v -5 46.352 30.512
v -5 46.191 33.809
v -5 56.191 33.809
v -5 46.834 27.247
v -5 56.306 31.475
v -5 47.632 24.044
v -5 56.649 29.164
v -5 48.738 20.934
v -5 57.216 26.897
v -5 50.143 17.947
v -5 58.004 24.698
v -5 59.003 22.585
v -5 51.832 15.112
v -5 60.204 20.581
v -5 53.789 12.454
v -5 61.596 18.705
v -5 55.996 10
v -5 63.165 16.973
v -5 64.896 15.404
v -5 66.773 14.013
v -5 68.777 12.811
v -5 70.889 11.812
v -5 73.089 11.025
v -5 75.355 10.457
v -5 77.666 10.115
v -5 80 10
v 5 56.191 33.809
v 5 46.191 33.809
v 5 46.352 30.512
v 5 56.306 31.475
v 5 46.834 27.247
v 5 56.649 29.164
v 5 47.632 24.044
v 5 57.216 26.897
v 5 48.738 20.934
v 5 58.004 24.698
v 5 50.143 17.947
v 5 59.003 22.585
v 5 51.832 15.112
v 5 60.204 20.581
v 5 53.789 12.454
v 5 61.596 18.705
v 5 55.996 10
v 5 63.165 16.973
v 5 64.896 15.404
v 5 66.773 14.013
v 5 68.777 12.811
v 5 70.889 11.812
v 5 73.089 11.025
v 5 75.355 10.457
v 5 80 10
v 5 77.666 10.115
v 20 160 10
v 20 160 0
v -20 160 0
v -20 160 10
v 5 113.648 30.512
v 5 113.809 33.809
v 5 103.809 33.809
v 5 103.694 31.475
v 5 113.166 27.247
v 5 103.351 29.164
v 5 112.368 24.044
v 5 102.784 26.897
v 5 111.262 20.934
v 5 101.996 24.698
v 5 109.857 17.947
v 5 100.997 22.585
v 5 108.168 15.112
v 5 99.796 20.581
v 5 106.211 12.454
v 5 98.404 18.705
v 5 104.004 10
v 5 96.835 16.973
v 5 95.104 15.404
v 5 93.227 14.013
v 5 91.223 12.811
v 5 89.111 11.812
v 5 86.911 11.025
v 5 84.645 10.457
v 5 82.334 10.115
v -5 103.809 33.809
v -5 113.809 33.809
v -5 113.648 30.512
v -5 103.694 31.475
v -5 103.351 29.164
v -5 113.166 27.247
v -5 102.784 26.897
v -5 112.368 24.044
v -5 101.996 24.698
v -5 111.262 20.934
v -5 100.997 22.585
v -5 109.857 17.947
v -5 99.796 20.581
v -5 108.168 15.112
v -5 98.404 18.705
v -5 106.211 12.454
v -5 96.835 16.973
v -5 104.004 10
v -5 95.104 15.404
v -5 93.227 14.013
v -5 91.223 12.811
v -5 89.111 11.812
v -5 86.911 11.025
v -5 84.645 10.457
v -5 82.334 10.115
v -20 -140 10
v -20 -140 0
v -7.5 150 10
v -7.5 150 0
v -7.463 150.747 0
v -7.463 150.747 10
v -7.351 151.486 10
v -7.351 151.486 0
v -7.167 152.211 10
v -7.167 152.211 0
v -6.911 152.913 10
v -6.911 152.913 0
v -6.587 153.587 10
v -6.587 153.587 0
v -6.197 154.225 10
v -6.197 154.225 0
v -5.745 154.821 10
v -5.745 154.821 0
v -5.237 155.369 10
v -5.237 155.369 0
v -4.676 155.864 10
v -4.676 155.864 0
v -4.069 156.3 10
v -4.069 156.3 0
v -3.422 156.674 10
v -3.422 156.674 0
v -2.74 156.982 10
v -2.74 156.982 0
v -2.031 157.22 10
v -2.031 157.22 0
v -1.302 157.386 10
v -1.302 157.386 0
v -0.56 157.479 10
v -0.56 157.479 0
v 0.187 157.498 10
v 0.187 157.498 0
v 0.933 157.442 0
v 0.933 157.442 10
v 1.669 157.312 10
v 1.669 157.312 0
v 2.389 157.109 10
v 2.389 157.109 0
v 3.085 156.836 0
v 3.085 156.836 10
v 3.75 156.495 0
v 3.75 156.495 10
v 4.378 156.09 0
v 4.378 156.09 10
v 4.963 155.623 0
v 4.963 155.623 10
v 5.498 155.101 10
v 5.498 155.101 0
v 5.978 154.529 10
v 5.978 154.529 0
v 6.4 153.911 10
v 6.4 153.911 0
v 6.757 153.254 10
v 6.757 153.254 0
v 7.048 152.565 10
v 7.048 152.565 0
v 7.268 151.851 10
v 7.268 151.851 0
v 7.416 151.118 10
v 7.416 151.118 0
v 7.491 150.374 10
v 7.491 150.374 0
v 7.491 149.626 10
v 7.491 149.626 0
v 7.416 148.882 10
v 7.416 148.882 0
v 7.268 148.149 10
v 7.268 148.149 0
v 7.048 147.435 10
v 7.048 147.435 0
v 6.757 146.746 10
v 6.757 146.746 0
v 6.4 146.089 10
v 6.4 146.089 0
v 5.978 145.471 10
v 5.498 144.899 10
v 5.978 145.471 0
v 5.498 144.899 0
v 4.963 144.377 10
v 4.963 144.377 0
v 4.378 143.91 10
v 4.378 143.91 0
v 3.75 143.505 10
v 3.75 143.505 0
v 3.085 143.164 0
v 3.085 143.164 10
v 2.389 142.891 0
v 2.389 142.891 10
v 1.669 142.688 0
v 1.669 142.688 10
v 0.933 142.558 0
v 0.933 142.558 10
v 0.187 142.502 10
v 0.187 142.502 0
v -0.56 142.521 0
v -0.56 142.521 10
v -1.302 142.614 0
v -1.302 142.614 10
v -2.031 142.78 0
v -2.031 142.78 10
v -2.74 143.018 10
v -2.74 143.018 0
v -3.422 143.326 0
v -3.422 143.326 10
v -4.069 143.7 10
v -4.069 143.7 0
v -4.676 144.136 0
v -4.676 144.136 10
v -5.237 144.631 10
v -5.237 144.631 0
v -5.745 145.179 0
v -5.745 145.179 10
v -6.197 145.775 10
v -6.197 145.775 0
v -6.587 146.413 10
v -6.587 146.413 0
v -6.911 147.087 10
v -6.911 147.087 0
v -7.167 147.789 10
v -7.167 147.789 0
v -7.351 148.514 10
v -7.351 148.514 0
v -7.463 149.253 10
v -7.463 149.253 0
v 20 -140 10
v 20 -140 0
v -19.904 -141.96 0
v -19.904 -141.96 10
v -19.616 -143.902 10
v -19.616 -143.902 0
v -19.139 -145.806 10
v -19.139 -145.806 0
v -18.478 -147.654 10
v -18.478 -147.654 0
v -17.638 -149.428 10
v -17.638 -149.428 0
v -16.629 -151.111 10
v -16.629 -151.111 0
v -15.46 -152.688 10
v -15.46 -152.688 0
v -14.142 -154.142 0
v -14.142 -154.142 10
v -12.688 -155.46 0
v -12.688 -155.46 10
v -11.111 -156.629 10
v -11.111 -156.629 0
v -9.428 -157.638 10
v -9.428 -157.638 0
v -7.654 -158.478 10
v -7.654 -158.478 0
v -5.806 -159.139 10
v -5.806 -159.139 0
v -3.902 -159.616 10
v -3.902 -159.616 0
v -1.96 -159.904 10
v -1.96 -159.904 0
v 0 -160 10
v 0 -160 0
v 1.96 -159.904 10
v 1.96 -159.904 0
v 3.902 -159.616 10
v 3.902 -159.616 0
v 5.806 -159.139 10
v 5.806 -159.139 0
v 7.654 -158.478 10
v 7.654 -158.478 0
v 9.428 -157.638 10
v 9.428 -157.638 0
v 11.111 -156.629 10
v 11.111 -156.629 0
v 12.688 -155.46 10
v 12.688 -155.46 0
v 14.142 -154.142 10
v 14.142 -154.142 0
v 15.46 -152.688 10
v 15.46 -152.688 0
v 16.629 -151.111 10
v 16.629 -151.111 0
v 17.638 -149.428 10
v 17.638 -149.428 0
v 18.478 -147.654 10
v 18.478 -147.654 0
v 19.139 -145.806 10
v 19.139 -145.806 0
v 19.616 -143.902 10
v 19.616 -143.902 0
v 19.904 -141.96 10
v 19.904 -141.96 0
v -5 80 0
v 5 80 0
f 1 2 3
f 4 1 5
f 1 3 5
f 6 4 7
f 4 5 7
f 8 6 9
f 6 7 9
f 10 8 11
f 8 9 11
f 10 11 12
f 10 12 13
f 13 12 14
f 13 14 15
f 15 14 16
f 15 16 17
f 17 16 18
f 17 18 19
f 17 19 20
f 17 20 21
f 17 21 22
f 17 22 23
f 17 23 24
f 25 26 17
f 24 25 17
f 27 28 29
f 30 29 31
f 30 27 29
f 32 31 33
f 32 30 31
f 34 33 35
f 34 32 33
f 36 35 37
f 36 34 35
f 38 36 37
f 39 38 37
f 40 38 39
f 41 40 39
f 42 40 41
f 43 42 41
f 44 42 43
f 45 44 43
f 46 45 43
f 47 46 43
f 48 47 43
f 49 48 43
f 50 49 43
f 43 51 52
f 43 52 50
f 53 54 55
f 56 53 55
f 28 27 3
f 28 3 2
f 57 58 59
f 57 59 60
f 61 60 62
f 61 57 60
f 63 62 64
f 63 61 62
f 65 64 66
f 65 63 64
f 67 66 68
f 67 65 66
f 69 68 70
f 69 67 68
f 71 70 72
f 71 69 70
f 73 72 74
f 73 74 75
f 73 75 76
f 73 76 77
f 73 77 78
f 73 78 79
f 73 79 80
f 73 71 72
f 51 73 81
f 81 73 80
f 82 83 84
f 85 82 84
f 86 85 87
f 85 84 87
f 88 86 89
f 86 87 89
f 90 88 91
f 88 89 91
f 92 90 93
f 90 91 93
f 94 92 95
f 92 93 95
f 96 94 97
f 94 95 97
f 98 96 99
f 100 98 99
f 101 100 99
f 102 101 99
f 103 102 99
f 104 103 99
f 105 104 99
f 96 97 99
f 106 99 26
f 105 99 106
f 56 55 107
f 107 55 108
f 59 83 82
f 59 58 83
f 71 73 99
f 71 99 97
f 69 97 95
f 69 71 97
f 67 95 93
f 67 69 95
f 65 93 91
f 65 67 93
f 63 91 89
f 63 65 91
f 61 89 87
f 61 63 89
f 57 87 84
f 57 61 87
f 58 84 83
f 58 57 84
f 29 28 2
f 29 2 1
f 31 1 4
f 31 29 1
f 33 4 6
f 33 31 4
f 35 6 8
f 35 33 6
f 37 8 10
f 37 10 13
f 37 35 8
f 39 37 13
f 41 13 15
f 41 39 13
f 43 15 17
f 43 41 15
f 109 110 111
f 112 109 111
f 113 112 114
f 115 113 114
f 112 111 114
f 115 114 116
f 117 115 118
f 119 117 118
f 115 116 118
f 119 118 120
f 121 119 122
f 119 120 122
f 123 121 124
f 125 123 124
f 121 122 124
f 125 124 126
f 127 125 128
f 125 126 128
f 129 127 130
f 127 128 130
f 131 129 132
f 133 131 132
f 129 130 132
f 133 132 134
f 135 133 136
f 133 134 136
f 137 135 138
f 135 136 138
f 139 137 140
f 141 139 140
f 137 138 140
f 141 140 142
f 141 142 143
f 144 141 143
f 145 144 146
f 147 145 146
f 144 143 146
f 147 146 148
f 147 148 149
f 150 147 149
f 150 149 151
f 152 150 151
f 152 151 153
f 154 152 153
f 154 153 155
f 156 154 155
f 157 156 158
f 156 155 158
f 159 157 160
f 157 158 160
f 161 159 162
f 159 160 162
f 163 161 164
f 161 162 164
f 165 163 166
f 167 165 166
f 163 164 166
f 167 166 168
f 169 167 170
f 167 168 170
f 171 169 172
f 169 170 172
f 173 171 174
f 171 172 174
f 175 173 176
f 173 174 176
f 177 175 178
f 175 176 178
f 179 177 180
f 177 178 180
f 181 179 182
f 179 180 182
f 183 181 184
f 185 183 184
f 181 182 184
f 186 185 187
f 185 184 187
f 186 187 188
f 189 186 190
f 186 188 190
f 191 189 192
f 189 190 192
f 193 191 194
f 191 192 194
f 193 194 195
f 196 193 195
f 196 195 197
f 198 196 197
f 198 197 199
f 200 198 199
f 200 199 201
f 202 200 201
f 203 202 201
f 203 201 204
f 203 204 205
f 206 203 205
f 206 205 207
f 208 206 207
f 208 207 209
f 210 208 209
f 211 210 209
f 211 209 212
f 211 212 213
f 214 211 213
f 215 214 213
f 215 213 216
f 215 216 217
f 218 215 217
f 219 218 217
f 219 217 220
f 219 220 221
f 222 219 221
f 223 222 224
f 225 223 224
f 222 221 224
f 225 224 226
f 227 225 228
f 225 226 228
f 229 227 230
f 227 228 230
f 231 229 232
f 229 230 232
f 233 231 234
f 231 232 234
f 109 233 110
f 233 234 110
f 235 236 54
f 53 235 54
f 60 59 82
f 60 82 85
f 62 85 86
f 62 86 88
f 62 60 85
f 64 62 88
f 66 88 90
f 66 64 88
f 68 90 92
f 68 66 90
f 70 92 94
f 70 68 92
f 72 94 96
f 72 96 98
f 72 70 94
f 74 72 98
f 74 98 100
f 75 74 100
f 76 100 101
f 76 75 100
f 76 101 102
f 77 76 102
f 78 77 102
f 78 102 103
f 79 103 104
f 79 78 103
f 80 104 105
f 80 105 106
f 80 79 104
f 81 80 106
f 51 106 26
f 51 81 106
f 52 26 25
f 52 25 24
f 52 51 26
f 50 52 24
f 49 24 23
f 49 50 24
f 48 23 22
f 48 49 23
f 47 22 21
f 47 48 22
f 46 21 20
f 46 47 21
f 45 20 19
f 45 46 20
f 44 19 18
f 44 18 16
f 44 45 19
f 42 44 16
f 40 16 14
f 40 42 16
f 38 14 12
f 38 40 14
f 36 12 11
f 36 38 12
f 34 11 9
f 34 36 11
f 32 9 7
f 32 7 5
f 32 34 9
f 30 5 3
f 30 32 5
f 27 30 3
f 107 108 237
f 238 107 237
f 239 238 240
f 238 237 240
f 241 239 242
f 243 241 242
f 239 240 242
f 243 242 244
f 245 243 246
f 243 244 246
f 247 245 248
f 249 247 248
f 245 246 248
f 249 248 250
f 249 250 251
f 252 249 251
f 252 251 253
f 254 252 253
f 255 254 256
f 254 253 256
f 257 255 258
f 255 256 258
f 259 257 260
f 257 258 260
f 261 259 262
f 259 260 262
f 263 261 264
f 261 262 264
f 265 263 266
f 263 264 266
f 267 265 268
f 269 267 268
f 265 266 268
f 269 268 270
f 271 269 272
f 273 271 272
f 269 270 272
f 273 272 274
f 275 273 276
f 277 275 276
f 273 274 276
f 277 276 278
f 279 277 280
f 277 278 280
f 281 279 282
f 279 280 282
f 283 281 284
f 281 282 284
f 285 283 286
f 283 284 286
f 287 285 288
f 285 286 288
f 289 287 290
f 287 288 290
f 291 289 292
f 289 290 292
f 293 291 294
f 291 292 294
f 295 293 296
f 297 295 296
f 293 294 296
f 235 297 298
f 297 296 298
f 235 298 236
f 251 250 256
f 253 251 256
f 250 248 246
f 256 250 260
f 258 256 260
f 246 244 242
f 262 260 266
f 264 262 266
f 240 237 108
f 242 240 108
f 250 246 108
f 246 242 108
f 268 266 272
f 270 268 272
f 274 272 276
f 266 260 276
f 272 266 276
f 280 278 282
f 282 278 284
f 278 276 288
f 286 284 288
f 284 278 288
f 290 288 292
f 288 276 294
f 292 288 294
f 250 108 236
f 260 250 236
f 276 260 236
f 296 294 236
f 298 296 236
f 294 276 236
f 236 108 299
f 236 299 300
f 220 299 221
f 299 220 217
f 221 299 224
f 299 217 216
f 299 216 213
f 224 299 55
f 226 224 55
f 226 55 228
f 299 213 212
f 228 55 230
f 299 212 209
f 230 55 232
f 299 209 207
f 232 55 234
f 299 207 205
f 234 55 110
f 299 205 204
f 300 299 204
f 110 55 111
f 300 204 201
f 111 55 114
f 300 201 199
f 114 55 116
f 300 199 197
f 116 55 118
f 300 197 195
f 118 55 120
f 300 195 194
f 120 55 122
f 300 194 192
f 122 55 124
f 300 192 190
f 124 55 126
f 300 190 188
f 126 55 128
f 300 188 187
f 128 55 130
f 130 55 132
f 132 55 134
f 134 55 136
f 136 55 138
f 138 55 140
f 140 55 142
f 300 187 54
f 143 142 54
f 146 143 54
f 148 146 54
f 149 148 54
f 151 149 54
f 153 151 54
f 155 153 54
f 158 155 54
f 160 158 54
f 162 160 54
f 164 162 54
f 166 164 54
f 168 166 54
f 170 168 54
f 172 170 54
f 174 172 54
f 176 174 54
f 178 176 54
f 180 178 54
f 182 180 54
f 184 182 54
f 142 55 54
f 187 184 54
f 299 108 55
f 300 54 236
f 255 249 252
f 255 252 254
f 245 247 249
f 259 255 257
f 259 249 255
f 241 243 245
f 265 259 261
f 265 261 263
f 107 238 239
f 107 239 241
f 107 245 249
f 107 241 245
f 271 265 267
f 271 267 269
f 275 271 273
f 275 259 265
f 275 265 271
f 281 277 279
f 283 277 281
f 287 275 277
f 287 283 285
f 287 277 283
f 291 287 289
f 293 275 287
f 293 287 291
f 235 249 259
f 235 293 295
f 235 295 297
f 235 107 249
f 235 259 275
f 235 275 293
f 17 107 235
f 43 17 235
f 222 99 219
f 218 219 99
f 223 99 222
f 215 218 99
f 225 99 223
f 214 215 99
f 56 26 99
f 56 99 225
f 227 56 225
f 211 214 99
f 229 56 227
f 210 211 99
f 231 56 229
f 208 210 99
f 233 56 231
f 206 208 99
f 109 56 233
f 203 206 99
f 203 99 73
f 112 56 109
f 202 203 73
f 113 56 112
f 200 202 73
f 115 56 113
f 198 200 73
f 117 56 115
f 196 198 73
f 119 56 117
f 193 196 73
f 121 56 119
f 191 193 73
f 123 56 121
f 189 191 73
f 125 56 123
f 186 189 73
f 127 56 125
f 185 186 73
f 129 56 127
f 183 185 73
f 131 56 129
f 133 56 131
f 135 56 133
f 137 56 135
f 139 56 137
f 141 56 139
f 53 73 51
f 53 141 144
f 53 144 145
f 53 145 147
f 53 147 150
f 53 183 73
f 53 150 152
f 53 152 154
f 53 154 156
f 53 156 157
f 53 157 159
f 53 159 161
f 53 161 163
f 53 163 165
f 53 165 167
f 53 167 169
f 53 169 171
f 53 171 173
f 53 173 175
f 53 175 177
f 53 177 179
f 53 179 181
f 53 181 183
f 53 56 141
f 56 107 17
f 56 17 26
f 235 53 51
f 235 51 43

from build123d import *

# Parameters (mm, degrees)
BOSS_EXTRUDE2_DEPTH      = 10
SKETCH2_R                = 7.5
CUT_EXTRUDE2_DEPTH       = 10
ELBOW_MOTOR_HOLDER_DEPTH = 5


with BuildPart() as part:
    # Sketch1 → Boss-Extrude2 (new body)
    with BuildSketch(Plane.XY):
        with BuildLine():
            Line((20, 160), (-20, 160))
            Line((-20, 160), (-20, -140.000000151))
            ThreePointArc((-20, -140.000000151), (7.5e-08, -160), (20, -140))
            Line((20, -140), (20, 160))
        make_face()
    extrude(amount=BOSS_EXTRUDE2_DEPTH)

    # Sketch2 → Cut-Extrude2 (cut)
    with BuildSketch(Plane(origin=(0, 0, 0), x_dir=(-1, 0, 0), z_dir=(0, 0, -1))):
        with Locations((0, 150)):
            Circle(SKETCH2_R)
    extrude(amount=-CUT_EXTRUDE2_DEPTH, mode=Mode.SUBTRACT)

    # Sketch3 → elbow motor holder (add, symmetric)
    with BuildSketch(Plane(origin=(0, 0, 0), x_dir=(0, 0, -1), z_dir=(1, 0, 0))):
        with BuildLine():
            Line((-33.808782217, 113.808782217), (-33.808782217, 103.808782217))
            ThreePointArc((-33.808782217, 103.808782217), (-10, 80), (-33.808782217, 56.191217783))
            Line((-33.808782217, 56.191217783), (-33.808782217, 46.191217783))
            ThreePointArc((-33.808782217, 46.191217783), (0, 80), (-33.808782217, 113.808782217))
        make_face()
    extrude(amount=ELBOW_MOTOR_HOLDER_DEPTH, both=True)


solid = part.part
